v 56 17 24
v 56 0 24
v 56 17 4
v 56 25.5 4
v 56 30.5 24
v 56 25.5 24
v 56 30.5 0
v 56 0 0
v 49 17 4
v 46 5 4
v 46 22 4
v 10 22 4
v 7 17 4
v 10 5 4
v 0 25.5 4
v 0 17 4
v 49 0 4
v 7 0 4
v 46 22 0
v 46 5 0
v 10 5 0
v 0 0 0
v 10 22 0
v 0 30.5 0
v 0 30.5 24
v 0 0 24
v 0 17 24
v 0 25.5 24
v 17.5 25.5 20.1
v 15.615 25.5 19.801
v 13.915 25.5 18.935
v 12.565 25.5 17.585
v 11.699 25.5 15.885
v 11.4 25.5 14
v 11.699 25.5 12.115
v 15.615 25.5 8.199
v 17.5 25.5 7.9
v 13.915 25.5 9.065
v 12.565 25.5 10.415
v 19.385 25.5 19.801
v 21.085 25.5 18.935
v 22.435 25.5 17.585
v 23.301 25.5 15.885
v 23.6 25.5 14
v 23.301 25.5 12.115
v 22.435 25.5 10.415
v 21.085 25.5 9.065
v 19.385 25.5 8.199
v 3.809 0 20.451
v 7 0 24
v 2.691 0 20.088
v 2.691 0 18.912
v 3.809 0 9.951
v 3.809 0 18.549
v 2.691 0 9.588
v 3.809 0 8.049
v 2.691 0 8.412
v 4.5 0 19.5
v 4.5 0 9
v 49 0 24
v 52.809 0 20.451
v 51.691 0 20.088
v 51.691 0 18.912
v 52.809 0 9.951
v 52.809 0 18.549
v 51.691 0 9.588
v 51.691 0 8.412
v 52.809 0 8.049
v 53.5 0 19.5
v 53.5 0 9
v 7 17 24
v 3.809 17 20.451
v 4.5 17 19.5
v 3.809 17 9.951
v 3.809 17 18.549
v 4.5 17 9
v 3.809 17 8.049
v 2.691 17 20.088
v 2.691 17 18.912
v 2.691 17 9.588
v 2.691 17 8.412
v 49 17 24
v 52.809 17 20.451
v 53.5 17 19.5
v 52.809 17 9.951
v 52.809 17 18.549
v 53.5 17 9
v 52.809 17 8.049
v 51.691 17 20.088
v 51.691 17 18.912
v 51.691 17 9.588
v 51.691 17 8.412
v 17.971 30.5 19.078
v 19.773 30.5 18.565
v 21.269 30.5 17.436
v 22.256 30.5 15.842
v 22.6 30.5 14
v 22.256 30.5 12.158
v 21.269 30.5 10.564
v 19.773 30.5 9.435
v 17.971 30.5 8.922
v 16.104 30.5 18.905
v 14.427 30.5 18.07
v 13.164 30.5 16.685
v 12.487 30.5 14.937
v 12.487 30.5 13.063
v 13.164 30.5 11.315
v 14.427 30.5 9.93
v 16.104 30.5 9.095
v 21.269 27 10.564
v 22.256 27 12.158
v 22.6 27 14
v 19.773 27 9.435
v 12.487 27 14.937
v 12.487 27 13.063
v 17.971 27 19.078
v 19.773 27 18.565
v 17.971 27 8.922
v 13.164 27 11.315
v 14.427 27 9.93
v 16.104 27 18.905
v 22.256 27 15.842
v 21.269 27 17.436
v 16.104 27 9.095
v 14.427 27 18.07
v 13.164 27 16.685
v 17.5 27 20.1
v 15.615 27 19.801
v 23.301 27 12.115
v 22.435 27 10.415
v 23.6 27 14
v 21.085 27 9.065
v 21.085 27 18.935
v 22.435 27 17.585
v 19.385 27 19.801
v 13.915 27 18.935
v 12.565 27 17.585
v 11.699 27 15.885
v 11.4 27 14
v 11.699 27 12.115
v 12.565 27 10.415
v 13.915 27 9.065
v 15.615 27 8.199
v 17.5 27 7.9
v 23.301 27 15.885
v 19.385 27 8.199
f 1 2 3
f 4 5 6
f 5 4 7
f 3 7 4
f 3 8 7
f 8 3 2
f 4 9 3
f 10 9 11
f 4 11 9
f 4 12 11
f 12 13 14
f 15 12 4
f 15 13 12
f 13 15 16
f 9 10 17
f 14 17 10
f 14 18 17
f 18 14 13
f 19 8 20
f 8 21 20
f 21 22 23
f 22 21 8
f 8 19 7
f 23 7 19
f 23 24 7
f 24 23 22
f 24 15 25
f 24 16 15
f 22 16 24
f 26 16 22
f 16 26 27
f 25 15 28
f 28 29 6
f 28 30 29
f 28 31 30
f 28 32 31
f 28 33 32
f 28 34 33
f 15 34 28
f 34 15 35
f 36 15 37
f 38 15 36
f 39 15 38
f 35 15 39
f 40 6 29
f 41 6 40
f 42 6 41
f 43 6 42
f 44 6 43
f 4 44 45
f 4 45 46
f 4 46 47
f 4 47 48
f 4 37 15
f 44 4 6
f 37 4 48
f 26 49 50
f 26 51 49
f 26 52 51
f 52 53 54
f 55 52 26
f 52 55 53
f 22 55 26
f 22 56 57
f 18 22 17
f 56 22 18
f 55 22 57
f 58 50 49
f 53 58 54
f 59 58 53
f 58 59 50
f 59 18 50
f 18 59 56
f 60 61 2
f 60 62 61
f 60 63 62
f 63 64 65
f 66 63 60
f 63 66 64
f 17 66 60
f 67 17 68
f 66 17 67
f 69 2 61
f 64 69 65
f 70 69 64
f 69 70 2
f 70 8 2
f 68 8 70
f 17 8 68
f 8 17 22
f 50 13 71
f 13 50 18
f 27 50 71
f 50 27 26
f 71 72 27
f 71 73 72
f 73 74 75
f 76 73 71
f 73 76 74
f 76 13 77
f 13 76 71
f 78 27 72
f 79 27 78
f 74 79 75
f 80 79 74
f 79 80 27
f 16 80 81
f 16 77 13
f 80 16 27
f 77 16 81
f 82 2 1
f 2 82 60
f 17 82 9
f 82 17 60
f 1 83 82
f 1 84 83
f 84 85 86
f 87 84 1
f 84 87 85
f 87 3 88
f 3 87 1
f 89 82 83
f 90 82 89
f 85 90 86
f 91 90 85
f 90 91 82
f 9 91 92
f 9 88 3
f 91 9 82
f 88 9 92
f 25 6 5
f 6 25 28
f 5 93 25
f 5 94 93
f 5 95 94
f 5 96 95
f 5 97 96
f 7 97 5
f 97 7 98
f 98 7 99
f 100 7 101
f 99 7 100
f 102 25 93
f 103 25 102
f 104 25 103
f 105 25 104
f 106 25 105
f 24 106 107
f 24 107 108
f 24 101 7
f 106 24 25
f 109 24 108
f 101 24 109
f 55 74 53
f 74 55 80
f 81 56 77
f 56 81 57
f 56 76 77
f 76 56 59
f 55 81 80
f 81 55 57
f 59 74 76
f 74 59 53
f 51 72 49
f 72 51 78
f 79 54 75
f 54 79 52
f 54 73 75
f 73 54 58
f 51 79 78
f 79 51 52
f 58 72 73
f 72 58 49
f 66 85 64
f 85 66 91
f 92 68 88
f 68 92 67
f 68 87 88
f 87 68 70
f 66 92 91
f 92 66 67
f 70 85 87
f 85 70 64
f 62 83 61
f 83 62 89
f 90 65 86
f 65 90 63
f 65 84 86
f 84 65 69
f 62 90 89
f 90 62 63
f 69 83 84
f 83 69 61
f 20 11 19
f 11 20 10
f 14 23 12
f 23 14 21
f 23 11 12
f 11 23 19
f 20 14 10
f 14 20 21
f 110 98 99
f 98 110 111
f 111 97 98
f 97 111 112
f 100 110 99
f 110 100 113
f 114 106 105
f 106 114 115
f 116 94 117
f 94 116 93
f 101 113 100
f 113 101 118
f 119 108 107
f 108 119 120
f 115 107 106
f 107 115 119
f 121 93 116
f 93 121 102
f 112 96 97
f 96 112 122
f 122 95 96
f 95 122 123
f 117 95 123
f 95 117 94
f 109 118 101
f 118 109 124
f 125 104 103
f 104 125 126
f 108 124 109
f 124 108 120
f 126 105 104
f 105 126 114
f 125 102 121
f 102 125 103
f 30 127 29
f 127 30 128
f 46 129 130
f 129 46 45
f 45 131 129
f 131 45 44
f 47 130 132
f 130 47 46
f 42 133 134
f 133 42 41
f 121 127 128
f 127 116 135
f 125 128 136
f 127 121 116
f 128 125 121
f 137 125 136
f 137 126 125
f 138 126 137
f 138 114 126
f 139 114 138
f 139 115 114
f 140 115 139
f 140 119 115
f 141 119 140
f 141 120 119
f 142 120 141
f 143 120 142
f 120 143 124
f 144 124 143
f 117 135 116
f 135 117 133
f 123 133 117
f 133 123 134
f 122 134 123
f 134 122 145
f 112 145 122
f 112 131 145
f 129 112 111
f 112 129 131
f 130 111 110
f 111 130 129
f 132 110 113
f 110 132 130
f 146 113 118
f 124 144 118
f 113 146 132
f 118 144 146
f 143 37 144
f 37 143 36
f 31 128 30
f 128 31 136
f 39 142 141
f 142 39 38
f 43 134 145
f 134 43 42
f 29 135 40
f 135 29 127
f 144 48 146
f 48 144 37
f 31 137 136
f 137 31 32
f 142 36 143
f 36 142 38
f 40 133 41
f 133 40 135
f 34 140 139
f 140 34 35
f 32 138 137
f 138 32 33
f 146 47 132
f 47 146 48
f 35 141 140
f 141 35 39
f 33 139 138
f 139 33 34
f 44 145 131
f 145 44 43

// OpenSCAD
floor_l = 55+1;//len有误差，长度增加1.
floor_w = 17;//width
floor_h = 4;//height
wall_l = 7;//len
wall_h = 20;//height

back_wall = 8.5;
back_wall_w = 5;

difference(){
    union(){
        //设置底座。
        cube(size=[floor_l,floor_w+back_wall,floor_h]);
        //设置左侧，放在底座上面。
        translate([0,0,floor_h]) cube(size=[wall_l,floor_w,wall_h]);
        //设置右侧，放在底座上面。
        translate([floor_l - wall_l ,0,floor_h]) cube(size=[wall_l,floor_w,wall_h]);
        
        //设置顶部
        //translate([0,0,wall_h+floor_h]) cube(size=[floor_l,floor_w,floor_h]);
        //设置侧面
        translate([0,floor_w++back_wall,0]) cube(size=[floor_l,back_wall_w,wall_h+floor_h]);
    }
    union(){
        //去掉螺丝孔
        screw_w = 2;
        //左侧
        translate([3.5,0,floor_h+5]) rotate(a=[270,0,0]) cylinder(h=floor_w,d=screw_w);
        translate([3.5,0,floor_h+5+10.5]) rotate(a=[270,0,0]) cylinder(h=floor_w,d=screw_w);
        //右侧
        translate([floor_l-3.5,0,floor_h+5]) rotate(a=[270,0,0]) cylinder(h=floor_w,d=screw_w);
        translate([floor_l-3.5,0,floor_h+5+10.5]) rotate(a=[270,0,0]) cylinder(h=floor_w,d=screw_w);
        //底部挖空减轻重量
        translate([10,5,0]) cube(size=[floor_l-20,floor_w,wall_h+floor_h*2]);
        
        //法兰盘卡槽。
        flange_w = floor_w+back_wall;
        translate([17.5,0,floor_h+wall_h/2]) rotate(a=[270,0,0])  cylinder(h=flange_w+100,d=10.2);
        translate([17.5,0,floor_h+wall_h/2]) rotate(a=[270,0,0]) cylinder(h=flange_w+1.5,d=12.2);
        
        //只打印一般测试。
        //translate([floor_l/2,0,0]) cube(size=[100,100,100]);
    }
}
